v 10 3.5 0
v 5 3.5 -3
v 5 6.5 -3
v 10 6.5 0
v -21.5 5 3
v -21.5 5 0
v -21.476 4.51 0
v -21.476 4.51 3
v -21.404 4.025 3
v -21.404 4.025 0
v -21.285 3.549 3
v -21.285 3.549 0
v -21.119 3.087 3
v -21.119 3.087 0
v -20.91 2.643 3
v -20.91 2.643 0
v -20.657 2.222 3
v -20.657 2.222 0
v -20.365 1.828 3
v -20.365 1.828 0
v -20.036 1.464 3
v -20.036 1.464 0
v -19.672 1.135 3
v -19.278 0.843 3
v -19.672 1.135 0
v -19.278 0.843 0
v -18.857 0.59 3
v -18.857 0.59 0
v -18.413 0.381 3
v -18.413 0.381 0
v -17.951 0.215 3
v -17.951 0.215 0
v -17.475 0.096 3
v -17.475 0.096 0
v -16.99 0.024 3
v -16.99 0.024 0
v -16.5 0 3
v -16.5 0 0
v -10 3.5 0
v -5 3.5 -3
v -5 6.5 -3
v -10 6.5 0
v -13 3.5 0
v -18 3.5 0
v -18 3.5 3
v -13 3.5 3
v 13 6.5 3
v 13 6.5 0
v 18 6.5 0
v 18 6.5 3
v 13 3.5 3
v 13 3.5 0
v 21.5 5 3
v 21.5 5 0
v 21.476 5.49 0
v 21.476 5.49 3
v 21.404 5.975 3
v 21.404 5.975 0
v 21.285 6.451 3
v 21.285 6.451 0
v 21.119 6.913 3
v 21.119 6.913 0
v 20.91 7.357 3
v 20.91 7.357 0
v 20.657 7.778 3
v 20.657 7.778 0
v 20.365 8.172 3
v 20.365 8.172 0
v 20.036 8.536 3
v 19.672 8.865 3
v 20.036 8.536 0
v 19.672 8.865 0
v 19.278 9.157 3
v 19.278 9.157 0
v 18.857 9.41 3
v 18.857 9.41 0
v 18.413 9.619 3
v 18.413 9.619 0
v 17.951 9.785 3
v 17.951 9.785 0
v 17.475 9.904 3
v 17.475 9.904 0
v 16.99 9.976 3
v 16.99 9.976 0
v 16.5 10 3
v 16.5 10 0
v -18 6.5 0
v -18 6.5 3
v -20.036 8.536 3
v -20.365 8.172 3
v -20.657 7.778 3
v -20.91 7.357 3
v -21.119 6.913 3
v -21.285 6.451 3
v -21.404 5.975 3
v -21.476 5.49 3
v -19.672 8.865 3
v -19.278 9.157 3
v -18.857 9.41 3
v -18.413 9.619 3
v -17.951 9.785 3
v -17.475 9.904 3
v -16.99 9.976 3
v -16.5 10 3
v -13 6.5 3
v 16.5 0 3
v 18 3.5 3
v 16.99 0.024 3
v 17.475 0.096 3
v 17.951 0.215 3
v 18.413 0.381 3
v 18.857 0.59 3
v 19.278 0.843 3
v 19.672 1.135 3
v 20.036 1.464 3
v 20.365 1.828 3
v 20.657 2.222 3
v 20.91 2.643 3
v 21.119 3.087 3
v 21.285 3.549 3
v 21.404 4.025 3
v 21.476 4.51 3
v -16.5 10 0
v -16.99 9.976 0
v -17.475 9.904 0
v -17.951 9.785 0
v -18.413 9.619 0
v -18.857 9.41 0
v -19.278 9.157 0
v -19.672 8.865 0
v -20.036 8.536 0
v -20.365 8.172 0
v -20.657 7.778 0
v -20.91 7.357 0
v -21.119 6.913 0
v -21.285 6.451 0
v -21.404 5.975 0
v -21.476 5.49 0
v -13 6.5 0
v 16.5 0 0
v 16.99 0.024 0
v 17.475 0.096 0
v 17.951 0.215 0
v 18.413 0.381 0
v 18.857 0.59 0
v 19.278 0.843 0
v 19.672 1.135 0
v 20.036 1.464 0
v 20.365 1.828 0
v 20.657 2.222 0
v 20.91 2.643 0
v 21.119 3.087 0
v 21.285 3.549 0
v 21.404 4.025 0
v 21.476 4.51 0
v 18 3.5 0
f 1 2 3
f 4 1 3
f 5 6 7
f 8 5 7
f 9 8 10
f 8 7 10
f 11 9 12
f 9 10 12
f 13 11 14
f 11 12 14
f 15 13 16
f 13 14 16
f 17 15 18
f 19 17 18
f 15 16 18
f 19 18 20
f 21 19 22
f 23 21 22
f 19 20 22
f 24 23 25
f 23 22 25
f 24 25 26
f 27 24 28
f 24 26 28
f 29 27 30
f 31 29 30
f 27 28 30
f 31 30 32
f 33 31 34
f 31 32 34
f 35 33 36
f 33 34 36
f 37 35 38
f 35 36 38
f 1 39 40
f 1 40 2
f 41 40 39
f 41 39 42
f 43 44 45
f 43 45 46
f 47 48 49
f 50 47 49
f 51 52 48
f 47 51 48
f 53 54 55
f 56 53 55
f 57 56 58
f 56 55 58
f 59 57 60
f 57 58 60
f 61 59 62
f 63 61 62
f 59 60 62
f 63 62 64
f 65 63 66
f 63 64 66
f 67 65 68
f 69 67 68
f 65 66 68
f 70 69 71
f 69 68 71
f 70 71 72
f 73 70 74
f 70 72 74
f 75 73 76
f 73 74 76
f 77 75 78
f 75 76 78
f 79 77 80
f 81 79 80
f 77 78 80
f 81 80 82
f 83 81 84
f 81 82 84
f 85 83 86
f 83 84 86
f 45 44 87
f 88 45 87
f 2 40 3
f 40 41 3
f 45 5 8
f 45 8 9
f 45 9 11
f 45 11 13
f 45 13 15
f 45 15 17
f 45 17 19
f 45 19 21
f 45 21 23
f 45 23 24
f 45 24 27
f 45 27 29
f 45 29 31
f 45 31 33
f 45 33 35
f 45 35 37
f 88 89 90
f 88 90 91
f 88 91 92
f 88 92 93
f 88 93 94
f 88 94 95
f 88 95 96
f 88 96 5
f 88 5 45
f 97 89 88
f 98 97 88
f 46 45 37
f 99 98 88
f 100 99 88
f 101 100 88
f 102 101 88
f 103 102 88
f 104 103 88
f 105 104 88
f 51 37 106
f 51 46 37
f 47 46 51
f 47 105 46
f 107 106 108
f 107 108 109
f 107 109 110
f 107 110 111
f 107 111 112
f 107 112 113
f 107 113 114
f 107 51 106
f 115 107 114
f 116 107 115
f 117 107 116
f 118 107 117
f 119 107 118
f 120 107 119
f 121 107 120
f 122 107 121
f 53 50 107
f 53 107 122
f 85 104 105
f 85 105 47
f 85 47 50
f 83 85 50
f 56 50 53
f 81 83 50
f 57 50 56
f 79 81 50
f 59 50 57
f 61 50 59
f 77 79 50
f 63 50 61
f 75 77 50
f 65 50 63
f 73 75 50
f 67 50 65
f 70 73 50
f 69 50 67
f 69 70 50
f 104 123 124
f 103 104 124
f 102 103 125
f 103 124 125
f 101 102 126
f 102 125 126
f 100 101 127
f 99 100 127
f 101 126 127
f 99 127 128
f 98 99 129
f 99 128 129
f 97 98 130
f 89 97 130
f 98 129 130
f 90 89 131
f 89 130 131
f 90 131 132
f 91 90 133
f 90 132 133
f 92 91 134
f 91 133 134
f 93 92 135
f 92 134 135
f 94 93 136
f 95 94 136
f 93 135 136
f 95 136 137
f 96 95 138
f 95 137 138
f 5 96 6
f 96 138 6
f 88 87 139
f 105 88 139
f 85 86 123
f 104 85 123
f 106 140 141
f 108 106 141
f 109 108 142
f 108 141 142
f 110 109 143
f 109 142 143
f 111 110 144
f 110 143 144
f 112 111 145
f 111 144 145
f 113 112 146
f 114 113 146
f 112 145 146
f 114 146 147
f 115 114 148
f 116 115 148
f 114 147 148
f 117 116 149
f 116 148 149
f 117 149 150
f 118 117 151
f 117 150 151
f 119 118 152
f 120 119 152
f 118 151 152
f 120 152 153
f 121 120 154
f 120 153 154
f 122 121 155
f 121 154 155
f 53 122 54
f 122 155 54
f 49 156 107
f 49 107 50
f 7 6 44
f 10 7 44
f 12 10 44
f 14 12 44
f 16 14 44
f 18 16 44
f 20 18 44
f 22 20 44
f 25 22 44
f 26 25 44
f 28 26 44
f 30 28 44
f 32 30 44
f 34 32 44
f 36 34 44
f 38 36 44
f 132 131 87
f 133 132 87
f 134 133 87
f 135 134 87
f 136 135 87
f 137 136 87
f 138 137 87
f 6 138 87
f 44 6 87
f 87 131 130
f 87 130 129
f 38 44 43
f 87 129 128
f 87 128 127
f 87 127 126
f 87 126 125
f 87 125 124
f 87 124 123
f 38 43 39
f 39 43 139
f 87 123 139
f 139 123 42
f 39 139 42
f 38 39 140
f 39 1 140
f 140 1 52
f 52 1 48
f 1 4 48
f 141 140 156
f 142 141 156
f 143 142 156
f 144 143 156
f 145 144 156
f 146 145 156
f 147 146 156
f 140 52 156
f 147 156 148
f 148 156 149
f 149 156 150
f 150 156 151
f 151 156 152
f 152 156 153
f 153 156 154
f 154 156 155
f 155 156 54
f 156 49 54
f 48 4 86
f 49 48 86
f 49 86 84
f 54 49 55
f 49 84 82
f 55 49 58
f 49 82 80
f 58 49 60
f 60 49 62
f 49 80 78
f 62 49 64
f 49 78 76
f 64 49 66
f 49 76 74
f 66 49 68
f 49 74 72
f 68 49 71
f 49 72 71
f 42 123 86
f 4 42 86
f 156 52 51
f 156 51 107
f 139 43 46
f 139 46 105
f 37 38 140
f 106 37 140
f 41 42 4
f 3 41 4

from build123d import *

# Parameters (mm, degrees)
F0_W       = 5
F0_H       = 3
F0_W_2     = 20
F1_DEPTH   = 3
F2_DEPTH   = 3
F3_SIZE2   = 4.99999
F3_SIZE    = 2.99999
F3_2_SIZE2 = 4.99999
F3_2_SIZE  = 2.99999


# Not quite as in the source:
# - a fillet or chamfer is up to 0.001 mm smaller than in the source, because OpenCascade refuses the exact size


with BuildPart() as f1:
    # F0 (on Top) → F1 (new body)
    with BuildSketch(Plane.XY):
        with BuildLine():
            Line((16.5, 10), (-16.5, 10))
            ThreePointArc((-16.5, 10), (-20.0355339059, 8.5355339059), (-21.5, 5))
            ThreePointArc((-21.5, 5), (-20.0355339059, 1.4644660941), (-16.5, 0))
            Line((-16.5, 0), (16.5, 0))
            ThreePointArc((16.5, 0), (20.0355339059, 1.4644660941), (21.5, 5))
            ThreePointArc((21.5, 5), (20.0355339059, 8.5355339059), (16.5, 10))
        make_face()
        with Locations((-15.5, 5)):
            Rectangle(F0_W, F0_H, mode=Mode.SUBTRACT)
        with Locations((0, 5)):
            Rectangle(F0_W_2, F0_H, mode=Mode.SUBTRACT)
        with Locations((15.5, 5)):
            Rectangle(F0_W, F0_H, mode=Mode.SUBTRACT)
        with Locations((0, 5)):
            Rectangle(F0_W_2, F0_H)
    extrude(amount=F1_DEPTH)

    # F0 (on Top) → F2 (join)
    with BuildSketch(Plane.XY):
        with Locations((0, 5)):
            Rectangle(F0_W_2, F0_H)
    extrude(amount=-F2_DEPTH)

    # F3 (size 3 and 5 in the source; OpenCascade refuses exactly that, so slightly less here)
    f3_edges = [f1.edges().sort_by_distance(p)[0] for p in [
        (-10, 5, -3),
    ]]
    f3_side = f1.faces().sort_by_distance((-10, 5, -1.5))[0]
    chamfer(f3_edges, length=F3_SIZE, length2=F3_SIZE2, reference=f3_side)

    # F3#2 (size 3 and 5 in the source; OpenCascade refuses exactly that, so slightly less here)
    f3_2_edges = [f1.edges().sort_by_distance(p)[0] for p in [
        (10, 5, -3),
    ]]
    f3_2_side = f1.faces().sort_by_distance((10, 5, -1.5))[0]
    chamfer(f3_2_edges, length=F3_2_SIZE, length2=F3_2_SIZE2, reference=f3_2_side)


solid = f1.part
